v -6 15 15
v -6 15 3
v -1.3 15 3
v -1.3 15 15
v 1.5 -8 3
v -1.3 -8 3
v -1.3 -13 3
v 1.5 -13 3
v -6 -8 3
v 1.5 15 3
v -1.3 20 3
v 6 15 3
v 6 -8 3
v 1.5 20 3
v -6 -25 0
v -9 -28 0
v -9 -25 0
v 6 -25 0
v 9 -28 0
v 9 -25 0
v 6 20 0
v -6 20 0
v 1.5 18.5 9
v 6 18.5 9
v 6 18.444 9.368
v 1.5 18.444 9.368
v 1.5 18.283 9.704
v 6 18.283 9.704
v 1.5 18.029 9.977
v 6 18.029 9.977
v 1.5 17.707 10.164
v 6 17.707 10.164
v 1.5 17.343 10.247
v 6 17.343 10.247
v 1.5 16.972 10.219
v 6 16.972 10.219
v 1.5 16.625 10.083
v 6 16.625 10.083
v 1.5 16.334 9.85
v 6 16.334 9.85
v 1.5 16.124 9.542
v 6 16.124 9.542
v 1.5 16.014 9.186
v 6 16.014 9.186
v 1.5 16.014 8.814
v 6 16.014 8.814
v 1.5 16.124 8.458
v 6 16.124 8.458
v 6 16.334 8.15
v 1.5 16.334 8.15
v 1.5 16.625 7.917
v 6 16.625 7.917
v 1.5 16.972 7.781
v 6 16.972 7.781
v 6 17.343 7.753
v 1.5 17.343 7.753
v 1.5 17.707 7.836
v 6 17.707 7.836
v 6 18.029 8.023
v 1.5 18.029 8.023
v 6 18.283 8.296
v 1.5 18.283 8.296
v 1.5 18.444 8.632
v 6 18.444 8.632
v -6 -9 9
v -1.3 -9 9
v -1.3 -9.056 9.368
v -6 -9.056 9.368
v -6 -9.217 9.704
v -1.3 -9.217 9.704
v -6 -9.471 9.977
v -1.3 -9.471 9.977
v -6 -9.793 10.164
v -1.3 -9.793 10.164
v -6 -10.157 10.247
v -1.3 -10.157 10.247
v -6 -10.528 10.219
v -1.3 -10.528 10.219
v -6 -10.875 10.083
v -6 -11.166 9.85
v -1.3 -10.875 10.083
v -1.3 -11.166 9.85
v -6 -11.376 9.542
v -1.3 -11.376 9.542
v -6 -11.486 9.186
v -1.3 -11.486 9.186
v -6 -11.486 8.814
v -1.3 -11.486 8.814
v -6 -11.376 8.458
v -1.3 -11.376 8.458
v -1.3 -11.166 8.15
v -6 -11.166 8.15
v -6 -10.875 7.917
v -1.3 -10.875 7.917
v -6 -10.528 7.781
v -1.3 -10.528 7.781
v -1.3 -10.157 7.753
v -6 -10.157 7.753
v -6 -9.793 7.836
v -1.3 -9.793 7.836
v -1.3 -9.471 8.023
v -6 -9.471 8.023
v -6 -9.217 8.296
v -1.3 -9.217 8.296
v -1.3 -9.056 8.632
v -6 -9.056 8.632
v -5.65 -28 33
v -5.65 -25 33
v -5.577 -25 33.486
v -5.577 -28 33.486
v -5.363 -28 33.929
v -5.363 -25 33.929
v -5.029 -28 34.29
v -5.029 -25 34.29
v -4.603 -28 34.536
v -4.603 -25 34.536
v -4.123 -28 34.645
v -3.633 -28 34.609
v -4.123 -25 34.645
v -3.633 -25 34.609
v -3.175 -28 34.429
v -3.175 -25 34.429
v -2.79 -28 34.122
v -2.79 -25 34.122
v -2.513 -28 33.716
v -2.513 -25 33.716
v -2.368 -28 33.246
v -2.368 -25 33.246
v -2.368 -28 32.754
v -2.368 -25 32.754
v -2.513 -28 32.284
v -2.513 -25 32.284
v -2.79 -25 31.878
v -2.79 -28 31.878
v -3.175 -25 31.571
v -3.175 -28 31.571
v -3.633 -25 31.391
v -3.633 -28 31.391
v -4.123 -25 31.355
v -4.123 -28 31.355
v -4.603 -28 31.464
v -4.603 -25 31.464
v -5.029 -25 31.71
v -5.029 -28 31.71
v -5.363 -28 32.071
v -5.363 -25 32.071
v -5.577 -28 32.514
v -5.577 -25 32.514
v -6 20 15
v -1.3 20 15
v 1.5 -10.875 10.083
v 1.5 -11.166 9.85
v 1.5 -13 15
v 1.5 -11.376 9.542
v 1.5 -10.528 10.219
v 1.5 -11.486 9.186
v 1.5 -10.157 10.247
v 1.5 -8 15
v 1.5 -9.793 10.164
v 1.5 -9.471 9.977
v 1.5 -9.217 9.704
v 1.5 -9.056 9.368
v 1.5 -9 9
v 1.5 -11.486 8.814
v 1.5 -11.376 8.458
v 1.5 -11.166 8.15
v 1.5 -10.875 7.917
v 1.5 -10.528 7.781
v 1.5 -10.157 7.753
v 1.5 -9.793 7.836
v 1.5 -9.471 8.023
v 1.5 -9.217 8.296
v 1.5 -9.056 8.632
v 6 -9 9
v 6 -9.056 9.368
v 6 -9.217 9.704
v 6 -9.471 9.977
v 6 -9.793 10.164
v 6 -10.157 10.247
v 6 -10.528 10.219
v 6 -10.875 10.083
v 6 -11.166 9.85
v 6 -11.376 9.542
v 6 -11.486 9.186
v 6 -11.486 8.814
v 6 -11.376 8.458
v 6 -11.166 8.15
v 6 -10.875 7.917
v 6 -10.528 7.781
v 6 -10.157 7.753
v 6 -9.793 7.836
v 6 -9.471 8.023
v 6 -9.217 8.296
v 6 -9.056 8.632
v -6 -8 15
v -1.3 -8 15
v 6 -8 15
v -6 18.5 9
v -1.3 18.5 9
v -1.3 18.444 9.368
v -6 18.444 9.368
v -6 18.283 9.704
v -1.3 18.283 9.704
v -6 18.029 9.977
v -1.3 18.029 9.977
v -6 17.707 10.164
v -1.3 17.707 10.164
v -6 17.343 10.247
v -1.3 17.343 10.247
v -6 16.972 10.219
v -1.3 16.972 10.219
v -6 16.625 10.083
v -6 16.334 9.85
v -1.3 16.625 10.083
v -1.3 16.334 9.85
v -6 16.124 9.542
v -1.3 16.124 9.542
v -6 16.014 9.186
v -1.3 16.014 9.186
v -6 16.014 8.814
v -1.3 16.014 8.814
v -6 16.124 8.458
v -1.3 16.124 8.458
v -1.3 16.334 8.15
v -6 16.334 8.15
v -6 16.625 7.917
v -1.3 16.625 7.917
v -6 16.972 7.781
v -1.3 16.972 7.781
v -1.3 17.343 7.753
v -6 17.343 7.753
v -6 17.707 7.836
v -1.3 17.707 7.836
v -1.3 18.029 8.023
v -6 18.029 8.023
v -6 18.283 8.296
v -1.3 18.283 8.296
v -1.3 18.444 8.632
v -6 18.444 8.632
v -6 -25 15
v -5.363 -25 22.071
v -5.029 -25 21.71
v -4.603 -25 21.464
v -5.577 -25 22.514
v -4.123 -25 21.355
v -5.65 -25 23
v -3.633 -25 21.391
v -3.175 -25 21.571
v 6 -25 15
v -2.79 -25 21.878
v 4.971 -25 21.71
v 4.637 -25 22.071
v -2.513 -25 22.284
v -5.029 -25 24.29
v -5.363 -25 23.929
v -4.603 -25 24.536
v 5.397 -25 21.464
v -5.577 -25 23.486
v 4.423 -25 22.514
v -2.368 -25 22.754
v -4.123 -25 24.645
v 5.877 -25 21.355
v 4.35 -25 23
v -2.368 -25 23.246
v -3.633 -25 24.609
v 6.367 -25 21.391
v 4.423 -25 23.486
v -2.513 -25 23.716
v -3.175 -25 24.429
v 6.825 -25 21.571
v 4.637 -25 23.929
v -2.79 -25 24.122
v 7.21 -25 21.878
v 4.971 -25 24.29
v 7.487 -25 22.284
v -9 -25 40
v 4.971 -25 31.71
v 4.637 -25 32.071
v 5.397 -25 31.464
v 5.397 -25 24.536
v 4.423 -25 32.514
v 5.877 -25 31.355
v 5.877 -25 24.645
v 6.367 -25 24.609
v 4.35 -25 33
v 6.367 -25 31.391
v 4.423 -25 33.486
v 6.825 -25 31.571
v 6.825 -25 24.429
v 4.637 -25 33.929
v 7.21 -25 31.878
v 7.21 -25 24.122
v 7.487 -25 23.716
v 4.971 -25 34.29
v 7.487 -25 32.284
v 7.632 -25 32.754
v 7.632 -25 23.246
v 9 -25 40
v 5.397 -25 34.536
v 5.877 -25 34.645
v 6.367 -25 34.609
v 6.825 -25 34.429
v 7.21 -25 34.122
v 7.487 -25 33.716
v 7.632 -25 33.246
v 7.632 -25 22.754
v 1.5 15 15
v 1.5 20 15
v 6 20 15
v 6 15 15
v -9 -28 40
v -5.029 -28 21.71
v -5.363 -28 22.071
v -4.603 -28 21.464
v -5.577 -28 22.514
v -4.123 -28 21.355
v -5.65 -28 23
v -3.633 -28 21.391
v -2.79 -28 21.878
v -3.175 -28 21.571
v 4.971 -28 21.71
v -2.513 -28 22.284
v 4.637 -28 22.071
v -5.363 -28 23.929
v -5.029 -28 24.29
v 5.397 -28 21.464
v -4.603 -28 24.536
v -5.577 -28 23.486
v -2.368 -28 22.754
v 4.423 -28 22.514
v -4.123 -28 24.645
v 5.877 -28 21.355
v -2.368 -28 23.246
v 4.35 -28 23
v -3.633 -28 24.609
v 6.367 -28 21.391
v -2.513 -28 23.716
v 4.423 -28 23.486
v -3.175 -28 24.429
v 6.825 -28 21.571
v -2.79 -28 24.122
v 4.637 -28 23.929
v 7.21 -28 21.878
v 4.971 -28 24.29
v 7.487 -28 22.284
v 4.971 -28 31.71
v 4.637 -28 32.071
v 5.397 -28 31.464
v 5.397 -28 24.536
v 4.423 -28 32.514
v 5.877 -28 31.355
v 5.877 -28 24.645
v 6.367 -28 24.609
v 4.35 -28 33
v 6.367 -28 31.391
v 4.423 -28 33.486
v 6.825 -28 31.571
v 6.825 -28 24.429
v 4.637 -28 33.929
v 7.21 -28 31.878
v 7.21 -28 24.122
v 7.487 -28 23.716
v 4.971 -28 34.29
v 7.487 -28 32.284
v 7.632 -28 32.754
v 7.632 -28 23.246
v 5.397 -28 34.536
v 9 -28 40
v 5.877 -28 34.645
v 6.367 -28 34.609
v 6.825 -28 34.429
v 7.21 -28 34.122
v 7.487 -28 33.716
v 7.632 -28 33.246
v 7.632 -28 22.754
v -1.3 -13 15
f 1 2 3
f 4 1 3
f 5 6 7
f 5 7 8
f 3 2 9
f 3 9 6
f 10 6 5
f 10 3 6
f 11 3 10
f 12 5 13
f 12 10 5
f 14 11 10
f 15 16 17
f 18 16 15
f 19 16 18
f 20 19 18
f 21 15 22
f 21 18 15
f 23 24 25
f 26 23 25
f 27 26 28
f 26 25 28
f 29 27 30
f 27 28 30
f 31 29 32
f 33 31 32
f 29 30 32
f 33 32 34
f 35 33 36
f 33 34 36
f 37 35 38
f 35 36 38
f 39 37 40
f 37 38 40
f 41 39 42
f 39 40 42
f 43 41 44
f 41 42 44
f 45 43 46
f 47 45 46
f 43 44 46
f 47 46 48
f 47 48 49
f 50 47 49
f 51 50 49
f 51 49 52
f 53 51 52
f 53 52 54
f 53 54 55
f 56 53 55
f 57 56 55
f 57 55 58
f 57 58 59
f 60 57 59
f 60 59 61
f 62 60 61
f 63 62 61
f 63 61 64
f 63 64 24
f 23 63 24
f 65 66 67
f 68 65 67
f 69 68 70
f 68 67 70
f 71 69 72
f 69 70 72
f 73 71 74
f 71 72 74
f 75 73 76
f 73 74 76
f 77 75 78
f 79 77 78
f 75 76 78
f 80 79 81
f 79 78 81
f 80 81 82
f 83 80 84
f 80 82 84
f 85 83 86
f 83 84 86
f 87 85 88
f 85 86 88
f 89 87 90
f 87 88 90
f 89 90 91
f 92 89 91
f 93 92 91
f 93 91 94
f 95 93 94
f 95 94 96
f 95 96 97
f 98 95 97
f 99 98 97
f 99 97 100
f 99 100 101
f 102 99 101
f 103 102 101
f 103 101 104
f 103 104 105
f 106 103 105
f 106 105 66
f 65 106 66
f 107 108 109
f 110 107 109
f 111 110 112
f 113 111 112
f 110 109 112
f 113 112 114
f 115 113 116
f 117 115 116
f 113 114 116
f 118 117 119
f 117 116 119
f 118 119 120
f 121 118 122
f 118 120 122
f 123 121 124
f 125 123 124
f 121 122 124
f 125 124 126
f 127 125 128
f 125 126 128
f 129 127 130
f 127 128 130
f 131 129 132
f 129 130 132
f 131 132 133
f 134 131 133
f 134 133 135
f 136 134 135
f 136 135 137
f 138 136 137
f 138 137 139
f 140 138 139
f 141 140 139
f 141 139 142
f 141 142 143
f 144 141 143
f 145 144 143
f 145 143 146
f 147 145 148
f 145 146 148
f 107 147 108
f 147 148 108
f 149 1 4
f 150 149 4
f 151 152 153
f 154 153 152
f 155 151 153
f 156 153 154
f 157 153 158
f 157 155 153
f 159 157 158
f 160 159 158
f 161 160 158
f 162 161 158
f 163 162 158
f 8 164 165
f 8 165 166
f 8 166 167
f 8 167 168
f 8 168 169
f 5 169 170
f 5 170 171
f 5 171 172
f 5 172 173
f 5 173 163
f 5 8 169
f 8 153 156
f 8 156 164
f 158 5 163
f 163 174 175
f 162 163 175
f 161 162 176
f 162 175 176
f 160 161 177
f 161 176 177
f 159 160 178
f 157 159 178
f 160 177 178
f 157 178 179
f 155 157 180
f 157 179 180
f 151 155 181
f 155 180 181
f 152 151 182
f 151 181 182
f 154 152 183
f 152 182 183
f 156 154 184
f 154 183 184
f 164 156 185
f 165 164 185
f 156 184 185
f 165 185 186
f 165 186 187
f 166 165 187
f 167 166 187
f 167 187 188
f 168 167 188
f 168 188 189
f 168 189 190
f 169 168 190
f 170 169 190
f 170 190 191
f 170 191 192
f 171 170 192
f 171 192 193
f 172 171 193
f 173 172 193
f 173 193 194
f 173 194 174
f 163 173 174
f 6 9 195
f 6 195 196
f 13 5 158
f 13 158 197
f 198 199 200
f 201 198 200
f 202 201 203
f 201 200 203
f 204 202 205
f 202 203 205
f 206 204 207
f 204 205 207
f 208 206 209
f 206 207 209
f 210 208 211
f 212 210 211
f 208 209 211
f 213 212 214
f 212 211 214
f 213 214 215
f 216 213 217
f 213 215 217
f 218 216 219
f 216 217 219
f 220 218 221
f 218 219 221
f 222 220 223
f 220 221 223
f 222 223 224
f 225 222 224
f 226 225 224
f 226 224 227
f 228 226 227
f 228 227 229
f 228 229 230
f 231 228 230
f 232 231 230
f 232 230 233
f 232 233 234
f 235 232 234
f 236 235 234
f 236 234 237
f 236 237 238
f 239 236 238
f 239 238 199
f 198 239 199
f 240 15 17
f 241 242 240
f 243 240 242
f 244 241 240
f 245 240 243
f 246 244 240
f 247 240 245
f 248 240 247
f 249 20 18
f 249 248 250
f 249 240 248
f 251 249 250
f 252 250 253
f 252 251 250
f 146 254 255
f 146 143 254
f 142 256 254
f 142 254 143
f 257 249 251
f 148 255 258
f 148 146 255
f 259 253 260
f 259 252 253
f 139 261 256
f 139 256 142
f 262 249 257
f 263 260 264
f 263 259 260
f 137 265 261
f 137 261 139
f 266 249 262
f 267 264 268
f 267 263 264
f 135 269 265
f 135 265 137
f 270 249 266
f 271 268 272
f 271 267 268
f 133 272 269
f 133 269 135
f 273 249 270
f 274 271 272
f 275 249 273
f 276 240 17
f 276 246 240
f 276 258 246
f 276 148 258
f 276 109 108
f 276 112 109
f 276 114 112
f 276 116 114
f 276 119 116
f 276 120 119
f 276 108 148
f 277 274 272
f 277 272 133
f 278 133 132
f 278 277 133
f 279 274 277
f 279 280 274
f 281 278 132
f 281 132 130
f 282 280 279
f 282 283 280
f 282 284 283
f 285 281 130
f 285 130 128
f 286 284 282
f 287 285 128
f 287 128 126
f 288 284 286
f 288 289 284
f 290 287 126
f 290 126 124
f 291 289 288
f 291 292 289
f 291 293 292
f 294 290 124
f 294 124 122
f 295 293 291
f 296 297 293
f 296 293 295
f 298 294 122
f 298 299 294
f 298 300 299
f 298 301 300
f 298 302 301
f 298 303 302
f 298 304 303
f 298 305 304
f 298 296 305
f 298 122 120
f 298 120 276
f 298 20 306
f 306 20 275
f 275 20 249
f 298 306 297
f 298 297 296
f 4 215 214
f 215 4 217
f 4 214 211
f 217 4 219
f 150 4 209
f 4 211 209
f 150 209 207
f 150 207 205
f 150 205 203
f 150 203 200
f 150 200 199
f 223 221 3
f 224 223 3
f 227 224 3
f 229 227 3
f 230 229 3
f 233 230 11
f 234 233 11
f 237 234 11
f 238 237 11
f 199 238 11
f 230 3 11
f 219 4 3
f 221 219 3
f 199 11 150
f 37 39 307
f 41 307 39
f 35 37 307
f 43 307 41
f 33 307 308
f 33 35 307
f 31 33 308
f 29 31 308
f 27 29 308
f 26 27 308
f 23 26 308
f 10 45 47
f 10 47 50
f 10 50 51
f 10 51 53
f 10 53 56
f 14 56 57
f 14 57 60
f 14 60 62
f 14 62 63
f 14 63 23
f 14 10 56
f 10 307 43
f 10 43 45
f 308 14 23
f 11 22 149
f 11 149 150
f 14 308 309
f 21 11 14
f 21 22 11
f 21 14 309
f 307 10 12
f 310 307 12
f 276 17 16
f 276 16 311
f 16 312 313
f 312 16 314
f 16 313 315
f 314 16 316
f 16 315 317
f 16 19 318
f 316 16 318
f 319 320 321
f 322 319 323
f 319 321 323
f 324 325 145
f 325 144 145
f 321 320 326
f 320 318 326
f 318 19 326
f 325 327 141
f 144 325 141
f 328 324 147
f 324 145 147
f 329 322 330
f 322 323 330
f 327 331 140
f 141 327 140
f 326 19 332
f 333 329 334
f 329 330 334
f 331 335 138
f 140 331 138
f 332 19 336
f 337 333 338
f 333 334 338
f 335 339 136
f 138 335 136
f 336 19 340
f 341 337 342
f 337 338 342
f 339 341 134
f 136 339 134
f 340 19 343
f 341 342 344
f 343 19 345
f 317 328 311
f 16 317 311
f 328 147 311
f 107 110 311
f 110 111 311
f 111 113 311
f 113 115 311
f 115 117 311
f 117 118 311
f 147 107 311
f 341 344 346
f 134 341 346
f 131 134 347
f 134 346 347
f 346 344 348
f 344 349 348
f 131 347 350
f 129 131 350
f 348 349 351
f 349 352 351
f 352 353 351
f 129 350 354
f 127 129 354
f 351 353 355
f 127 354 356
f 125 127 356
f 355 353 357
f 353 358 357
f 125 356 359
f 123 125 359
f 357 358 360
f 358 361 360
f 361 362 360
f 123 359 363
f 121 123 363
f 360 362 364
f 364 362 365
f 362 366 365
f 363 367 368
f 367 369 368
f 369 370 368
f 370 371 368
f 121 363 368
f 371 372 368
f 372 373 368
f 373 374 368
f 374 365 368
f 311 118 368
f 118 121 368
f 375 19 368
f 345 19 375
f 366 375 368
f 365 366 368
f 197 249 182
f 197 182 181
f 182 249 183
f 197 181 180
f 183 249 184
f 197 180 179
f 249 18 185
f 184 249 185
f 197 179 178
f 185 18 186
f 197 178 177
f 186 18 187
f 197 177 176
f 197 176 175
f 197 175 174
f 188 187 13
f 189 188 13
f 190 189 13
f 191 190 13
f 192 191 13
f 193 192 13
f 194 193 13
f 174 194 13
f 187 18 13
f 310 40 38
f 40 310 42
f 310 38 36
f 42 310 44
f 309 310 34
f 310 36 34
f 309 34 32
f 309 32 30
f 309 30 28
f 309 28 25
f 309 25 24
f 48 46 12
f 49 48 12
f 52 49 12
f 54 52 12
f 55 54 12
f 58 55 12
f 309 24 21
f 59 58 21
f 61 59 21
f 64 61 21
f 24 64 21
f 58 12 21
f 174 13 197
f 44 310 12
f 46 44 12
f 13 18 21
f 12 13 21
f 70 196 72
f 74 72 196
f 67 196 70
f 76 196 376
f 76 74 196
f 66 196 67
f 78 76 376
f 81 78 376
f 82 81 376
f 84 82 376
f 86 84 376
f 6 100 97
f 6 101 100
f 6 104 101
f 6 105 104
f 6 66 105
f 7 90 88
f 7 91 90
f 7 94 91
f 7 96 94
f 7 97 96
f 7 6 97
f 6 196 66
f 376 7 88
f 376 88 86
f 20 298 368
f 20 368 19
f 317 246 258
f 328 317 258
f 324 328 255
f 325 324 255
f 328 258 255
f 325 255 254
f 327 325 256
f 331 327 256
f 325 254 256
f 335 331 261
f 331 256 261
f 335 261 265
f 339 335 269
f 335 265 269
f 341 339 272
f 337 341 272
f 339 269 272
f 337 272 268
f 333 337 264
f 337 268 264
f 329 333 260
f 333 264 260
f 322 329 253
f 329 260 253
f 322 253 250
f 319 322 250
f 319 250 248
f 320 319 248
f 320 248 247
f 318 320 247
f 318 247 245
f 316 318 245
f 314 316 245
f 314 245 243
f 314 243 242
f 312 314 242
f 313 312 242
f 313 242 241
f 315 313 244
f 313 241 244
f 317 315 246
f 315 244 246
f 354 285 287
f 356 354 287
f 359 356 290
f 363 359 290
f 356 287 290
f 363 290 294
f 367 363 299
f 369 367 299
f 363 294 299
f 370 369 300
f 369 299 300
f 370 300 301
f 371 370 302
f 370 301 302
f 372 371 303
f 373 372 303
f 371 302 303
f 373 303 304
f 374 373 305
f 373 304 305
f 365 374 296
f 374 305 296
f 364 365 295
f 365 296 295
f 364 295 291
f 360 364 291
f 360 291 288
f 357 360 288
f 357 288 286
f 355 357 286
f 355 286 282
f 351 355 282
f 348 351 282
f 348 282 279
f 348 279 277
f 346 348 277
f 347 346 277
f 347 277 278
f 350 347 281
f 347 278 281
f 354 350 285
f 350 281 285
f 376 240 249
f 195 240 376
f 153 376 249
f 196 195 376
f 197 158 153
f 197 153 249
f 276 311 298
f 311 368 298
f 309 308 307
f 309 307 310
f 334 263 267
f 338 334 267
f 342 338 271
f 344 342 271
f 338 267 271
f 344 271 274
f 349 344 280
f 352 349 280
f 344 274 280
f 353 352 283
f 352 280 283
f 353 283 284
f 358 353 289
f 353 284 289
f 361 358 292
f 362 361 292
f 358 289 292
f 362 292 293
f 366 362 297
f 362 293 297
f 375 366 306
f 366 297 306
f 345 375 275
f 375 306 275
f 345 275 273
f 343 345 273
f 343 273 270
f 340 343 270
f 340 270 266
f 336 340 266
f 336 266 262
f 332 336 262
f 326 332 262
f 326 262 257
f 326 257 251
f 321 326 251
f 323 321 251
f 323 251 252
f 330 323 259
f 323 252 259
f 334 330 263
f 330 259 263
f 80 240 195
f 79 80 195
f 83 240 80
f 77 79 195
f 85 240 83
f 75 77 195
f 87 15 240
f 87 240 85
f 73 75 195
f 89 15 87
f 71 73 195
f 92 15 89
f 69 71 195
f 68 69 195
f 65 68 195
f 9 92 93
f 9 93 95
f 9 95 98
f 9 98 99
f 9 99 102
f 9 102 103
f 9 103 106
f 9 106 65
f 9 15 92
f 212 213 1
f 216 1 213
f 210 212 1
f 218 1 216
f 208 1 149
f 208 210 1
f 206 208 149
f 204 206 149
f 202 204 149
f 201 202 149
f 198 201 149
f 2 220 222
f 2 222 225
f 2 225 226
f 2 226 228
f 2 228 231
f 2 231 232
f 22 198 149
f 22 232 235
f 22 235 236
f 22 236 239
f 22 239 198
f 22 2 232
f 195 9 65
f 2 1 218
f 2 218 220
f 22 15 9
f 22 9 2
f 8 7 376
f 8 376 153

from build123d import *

# Parameters (mm, degrees)
SKETCH_1_W          = 12
SKETCH_1_H          = 40
EXTRUDE_1_DEPTH     = 3
SKETCH_2_W          = 4.5
SKETCH_2_H          = 5
SKETCH_2_W_2        = 4.7
EXTRUDE_2_DEPTH     = 12
SKETCH_3_R          = 1.25
CUT_EXTRUDE_1_DEPTH = 12
SKETCH_4_W          = 12
SKETCH_4_H          = 15
EXTRUDE_3_DEPTH     = 8
SKETCH_5_W          = 12
SKETCH_5_H          = 3
EXTRUDE_4_DEPTH     = 25
SKETCH_6_W          = 40
SKETCH_6_H          = 3
EXTRUDE_5_DEPTH     = 3
SKETCH_7_R          = 1.65
CUT_EXTRUDE_2_DEPTH = 3
SKETCH_8_W          = 40
SKETCH_8_H          = 3
EXTRUDE_6_DEPTH     = 3


with BuildPart() as part:
    # 草图1 → 凸台-拉伸1 (new body)
    with BuildSketch(Plane.XY):
        Rectangle(SKETCH_1_W, SKETCH_1_H)
    extrude(amount=EXTRUDE_1_DEPTH)

    # 草图2 → 凸台-拉伸2 (add)
    with BuildSketch(Plane.XY.offset(3)):
        with Locations((3.75, 17.5)):
            Rectangle(SKETCH_2_W, SKETCH_2_H)
        with Locations((-3.65, 17.5)):
            Rectangle(SKETCH_2_W_2, SKETCH_2_H)
        Polygon((-6, -8), (-1.3, -8), (-1.3, -13), (1.5, -13), (1.5, -8), (6, -8), (6, -20), (-6, -20), align=None)
    extrude(amount=EXTRUDE_2_DEPTH)

    # 草图3 → 切除-拉伸1 (cut)
    with BuildSketch(Plane(origin=(6, 0, 0), x_dir=(0, 0, -1), z_dir=(1, 0, 0))):
        with Locations(Location((-9, 17.25, 0), (0, 0, 90))):
            Circle(SKETCH_3_R)
        with Locations(Location((-9, -10.25, 0), (0, 0, 90))):
            Circle(SKETCH_3_R)
    extrude(amount=-CUT_EXTRUDE_1_DEPTH, mode=Mode.SUBTRACT)

    # 草图4 → 凸台-拉伸3 (add)
    with BuildSketch(Plane.XZ.offset(20)):
        with Locations((0, 7.5)):
            Rectangle(SKETCH_4_W, SKETCH_4_H)
    extrude(amount=EXTRUDE_3_DEPTH)

    # 草图5 → 凸台-拉伸4 (add)
    with BuildSketch(Plane.XY.offset(15)):
        with Locations((0, -26.5)):
            Rectangle(SKETCH_5_W, SKETCH_5_H)
    extrude(amount=EXTRUDE_4_DEPTH)

    # 草图6 → 凸台-拉伸5 (add)
    with BuildSketch(Plane(origin=(6, 0, 0), x_dir=(0, 0, -1), z_dir=(1, 0, 0))):
        with Locations((-20, -26.5)):
            Rectangle(SKETCH_6_W, SKETCH_6_H)
    extrude(amount=EXTRUDE_5_DEPTH)

    # 草图7 → 切除-拉伸2 (cut)
    with BuildSketch(Plane(origin=(0, -25, 0), x_dir=(1, 0, 0), z_dir=(0, 1, 0))):
        with Locations(Location((6, -23, 0), (0, 0, 180))):
            Circle(SKETCH_7_R)
        with Locations(Location((6, -33, 0), (0, 0, 180))):
            Circle(SKETCH_7_R)
        with Locations(Location((-4, -23, 0), (0, 0, 180))):
            Circle(SKETCH_7_R)
        with Locations(Location((-4, -33, 0), (0, 0, 180))):
            Circle(SKETCH_7_R)
    extrude(amount=-CUT_EXTRUDE_2_DEPTH, mode=Mode.SUBTRACT)

    # 草图8 → 凸台-拉伸6 (add)
    with BuildSketch(Plane.ZY.offset(6)):
        with Locations((20, -26.5)):
            Rectangle(SKETCH_8_W, SKETCH_8_H)
    extrude(amount=EXTRUDE_6_DEPTH)


solid = part.part
